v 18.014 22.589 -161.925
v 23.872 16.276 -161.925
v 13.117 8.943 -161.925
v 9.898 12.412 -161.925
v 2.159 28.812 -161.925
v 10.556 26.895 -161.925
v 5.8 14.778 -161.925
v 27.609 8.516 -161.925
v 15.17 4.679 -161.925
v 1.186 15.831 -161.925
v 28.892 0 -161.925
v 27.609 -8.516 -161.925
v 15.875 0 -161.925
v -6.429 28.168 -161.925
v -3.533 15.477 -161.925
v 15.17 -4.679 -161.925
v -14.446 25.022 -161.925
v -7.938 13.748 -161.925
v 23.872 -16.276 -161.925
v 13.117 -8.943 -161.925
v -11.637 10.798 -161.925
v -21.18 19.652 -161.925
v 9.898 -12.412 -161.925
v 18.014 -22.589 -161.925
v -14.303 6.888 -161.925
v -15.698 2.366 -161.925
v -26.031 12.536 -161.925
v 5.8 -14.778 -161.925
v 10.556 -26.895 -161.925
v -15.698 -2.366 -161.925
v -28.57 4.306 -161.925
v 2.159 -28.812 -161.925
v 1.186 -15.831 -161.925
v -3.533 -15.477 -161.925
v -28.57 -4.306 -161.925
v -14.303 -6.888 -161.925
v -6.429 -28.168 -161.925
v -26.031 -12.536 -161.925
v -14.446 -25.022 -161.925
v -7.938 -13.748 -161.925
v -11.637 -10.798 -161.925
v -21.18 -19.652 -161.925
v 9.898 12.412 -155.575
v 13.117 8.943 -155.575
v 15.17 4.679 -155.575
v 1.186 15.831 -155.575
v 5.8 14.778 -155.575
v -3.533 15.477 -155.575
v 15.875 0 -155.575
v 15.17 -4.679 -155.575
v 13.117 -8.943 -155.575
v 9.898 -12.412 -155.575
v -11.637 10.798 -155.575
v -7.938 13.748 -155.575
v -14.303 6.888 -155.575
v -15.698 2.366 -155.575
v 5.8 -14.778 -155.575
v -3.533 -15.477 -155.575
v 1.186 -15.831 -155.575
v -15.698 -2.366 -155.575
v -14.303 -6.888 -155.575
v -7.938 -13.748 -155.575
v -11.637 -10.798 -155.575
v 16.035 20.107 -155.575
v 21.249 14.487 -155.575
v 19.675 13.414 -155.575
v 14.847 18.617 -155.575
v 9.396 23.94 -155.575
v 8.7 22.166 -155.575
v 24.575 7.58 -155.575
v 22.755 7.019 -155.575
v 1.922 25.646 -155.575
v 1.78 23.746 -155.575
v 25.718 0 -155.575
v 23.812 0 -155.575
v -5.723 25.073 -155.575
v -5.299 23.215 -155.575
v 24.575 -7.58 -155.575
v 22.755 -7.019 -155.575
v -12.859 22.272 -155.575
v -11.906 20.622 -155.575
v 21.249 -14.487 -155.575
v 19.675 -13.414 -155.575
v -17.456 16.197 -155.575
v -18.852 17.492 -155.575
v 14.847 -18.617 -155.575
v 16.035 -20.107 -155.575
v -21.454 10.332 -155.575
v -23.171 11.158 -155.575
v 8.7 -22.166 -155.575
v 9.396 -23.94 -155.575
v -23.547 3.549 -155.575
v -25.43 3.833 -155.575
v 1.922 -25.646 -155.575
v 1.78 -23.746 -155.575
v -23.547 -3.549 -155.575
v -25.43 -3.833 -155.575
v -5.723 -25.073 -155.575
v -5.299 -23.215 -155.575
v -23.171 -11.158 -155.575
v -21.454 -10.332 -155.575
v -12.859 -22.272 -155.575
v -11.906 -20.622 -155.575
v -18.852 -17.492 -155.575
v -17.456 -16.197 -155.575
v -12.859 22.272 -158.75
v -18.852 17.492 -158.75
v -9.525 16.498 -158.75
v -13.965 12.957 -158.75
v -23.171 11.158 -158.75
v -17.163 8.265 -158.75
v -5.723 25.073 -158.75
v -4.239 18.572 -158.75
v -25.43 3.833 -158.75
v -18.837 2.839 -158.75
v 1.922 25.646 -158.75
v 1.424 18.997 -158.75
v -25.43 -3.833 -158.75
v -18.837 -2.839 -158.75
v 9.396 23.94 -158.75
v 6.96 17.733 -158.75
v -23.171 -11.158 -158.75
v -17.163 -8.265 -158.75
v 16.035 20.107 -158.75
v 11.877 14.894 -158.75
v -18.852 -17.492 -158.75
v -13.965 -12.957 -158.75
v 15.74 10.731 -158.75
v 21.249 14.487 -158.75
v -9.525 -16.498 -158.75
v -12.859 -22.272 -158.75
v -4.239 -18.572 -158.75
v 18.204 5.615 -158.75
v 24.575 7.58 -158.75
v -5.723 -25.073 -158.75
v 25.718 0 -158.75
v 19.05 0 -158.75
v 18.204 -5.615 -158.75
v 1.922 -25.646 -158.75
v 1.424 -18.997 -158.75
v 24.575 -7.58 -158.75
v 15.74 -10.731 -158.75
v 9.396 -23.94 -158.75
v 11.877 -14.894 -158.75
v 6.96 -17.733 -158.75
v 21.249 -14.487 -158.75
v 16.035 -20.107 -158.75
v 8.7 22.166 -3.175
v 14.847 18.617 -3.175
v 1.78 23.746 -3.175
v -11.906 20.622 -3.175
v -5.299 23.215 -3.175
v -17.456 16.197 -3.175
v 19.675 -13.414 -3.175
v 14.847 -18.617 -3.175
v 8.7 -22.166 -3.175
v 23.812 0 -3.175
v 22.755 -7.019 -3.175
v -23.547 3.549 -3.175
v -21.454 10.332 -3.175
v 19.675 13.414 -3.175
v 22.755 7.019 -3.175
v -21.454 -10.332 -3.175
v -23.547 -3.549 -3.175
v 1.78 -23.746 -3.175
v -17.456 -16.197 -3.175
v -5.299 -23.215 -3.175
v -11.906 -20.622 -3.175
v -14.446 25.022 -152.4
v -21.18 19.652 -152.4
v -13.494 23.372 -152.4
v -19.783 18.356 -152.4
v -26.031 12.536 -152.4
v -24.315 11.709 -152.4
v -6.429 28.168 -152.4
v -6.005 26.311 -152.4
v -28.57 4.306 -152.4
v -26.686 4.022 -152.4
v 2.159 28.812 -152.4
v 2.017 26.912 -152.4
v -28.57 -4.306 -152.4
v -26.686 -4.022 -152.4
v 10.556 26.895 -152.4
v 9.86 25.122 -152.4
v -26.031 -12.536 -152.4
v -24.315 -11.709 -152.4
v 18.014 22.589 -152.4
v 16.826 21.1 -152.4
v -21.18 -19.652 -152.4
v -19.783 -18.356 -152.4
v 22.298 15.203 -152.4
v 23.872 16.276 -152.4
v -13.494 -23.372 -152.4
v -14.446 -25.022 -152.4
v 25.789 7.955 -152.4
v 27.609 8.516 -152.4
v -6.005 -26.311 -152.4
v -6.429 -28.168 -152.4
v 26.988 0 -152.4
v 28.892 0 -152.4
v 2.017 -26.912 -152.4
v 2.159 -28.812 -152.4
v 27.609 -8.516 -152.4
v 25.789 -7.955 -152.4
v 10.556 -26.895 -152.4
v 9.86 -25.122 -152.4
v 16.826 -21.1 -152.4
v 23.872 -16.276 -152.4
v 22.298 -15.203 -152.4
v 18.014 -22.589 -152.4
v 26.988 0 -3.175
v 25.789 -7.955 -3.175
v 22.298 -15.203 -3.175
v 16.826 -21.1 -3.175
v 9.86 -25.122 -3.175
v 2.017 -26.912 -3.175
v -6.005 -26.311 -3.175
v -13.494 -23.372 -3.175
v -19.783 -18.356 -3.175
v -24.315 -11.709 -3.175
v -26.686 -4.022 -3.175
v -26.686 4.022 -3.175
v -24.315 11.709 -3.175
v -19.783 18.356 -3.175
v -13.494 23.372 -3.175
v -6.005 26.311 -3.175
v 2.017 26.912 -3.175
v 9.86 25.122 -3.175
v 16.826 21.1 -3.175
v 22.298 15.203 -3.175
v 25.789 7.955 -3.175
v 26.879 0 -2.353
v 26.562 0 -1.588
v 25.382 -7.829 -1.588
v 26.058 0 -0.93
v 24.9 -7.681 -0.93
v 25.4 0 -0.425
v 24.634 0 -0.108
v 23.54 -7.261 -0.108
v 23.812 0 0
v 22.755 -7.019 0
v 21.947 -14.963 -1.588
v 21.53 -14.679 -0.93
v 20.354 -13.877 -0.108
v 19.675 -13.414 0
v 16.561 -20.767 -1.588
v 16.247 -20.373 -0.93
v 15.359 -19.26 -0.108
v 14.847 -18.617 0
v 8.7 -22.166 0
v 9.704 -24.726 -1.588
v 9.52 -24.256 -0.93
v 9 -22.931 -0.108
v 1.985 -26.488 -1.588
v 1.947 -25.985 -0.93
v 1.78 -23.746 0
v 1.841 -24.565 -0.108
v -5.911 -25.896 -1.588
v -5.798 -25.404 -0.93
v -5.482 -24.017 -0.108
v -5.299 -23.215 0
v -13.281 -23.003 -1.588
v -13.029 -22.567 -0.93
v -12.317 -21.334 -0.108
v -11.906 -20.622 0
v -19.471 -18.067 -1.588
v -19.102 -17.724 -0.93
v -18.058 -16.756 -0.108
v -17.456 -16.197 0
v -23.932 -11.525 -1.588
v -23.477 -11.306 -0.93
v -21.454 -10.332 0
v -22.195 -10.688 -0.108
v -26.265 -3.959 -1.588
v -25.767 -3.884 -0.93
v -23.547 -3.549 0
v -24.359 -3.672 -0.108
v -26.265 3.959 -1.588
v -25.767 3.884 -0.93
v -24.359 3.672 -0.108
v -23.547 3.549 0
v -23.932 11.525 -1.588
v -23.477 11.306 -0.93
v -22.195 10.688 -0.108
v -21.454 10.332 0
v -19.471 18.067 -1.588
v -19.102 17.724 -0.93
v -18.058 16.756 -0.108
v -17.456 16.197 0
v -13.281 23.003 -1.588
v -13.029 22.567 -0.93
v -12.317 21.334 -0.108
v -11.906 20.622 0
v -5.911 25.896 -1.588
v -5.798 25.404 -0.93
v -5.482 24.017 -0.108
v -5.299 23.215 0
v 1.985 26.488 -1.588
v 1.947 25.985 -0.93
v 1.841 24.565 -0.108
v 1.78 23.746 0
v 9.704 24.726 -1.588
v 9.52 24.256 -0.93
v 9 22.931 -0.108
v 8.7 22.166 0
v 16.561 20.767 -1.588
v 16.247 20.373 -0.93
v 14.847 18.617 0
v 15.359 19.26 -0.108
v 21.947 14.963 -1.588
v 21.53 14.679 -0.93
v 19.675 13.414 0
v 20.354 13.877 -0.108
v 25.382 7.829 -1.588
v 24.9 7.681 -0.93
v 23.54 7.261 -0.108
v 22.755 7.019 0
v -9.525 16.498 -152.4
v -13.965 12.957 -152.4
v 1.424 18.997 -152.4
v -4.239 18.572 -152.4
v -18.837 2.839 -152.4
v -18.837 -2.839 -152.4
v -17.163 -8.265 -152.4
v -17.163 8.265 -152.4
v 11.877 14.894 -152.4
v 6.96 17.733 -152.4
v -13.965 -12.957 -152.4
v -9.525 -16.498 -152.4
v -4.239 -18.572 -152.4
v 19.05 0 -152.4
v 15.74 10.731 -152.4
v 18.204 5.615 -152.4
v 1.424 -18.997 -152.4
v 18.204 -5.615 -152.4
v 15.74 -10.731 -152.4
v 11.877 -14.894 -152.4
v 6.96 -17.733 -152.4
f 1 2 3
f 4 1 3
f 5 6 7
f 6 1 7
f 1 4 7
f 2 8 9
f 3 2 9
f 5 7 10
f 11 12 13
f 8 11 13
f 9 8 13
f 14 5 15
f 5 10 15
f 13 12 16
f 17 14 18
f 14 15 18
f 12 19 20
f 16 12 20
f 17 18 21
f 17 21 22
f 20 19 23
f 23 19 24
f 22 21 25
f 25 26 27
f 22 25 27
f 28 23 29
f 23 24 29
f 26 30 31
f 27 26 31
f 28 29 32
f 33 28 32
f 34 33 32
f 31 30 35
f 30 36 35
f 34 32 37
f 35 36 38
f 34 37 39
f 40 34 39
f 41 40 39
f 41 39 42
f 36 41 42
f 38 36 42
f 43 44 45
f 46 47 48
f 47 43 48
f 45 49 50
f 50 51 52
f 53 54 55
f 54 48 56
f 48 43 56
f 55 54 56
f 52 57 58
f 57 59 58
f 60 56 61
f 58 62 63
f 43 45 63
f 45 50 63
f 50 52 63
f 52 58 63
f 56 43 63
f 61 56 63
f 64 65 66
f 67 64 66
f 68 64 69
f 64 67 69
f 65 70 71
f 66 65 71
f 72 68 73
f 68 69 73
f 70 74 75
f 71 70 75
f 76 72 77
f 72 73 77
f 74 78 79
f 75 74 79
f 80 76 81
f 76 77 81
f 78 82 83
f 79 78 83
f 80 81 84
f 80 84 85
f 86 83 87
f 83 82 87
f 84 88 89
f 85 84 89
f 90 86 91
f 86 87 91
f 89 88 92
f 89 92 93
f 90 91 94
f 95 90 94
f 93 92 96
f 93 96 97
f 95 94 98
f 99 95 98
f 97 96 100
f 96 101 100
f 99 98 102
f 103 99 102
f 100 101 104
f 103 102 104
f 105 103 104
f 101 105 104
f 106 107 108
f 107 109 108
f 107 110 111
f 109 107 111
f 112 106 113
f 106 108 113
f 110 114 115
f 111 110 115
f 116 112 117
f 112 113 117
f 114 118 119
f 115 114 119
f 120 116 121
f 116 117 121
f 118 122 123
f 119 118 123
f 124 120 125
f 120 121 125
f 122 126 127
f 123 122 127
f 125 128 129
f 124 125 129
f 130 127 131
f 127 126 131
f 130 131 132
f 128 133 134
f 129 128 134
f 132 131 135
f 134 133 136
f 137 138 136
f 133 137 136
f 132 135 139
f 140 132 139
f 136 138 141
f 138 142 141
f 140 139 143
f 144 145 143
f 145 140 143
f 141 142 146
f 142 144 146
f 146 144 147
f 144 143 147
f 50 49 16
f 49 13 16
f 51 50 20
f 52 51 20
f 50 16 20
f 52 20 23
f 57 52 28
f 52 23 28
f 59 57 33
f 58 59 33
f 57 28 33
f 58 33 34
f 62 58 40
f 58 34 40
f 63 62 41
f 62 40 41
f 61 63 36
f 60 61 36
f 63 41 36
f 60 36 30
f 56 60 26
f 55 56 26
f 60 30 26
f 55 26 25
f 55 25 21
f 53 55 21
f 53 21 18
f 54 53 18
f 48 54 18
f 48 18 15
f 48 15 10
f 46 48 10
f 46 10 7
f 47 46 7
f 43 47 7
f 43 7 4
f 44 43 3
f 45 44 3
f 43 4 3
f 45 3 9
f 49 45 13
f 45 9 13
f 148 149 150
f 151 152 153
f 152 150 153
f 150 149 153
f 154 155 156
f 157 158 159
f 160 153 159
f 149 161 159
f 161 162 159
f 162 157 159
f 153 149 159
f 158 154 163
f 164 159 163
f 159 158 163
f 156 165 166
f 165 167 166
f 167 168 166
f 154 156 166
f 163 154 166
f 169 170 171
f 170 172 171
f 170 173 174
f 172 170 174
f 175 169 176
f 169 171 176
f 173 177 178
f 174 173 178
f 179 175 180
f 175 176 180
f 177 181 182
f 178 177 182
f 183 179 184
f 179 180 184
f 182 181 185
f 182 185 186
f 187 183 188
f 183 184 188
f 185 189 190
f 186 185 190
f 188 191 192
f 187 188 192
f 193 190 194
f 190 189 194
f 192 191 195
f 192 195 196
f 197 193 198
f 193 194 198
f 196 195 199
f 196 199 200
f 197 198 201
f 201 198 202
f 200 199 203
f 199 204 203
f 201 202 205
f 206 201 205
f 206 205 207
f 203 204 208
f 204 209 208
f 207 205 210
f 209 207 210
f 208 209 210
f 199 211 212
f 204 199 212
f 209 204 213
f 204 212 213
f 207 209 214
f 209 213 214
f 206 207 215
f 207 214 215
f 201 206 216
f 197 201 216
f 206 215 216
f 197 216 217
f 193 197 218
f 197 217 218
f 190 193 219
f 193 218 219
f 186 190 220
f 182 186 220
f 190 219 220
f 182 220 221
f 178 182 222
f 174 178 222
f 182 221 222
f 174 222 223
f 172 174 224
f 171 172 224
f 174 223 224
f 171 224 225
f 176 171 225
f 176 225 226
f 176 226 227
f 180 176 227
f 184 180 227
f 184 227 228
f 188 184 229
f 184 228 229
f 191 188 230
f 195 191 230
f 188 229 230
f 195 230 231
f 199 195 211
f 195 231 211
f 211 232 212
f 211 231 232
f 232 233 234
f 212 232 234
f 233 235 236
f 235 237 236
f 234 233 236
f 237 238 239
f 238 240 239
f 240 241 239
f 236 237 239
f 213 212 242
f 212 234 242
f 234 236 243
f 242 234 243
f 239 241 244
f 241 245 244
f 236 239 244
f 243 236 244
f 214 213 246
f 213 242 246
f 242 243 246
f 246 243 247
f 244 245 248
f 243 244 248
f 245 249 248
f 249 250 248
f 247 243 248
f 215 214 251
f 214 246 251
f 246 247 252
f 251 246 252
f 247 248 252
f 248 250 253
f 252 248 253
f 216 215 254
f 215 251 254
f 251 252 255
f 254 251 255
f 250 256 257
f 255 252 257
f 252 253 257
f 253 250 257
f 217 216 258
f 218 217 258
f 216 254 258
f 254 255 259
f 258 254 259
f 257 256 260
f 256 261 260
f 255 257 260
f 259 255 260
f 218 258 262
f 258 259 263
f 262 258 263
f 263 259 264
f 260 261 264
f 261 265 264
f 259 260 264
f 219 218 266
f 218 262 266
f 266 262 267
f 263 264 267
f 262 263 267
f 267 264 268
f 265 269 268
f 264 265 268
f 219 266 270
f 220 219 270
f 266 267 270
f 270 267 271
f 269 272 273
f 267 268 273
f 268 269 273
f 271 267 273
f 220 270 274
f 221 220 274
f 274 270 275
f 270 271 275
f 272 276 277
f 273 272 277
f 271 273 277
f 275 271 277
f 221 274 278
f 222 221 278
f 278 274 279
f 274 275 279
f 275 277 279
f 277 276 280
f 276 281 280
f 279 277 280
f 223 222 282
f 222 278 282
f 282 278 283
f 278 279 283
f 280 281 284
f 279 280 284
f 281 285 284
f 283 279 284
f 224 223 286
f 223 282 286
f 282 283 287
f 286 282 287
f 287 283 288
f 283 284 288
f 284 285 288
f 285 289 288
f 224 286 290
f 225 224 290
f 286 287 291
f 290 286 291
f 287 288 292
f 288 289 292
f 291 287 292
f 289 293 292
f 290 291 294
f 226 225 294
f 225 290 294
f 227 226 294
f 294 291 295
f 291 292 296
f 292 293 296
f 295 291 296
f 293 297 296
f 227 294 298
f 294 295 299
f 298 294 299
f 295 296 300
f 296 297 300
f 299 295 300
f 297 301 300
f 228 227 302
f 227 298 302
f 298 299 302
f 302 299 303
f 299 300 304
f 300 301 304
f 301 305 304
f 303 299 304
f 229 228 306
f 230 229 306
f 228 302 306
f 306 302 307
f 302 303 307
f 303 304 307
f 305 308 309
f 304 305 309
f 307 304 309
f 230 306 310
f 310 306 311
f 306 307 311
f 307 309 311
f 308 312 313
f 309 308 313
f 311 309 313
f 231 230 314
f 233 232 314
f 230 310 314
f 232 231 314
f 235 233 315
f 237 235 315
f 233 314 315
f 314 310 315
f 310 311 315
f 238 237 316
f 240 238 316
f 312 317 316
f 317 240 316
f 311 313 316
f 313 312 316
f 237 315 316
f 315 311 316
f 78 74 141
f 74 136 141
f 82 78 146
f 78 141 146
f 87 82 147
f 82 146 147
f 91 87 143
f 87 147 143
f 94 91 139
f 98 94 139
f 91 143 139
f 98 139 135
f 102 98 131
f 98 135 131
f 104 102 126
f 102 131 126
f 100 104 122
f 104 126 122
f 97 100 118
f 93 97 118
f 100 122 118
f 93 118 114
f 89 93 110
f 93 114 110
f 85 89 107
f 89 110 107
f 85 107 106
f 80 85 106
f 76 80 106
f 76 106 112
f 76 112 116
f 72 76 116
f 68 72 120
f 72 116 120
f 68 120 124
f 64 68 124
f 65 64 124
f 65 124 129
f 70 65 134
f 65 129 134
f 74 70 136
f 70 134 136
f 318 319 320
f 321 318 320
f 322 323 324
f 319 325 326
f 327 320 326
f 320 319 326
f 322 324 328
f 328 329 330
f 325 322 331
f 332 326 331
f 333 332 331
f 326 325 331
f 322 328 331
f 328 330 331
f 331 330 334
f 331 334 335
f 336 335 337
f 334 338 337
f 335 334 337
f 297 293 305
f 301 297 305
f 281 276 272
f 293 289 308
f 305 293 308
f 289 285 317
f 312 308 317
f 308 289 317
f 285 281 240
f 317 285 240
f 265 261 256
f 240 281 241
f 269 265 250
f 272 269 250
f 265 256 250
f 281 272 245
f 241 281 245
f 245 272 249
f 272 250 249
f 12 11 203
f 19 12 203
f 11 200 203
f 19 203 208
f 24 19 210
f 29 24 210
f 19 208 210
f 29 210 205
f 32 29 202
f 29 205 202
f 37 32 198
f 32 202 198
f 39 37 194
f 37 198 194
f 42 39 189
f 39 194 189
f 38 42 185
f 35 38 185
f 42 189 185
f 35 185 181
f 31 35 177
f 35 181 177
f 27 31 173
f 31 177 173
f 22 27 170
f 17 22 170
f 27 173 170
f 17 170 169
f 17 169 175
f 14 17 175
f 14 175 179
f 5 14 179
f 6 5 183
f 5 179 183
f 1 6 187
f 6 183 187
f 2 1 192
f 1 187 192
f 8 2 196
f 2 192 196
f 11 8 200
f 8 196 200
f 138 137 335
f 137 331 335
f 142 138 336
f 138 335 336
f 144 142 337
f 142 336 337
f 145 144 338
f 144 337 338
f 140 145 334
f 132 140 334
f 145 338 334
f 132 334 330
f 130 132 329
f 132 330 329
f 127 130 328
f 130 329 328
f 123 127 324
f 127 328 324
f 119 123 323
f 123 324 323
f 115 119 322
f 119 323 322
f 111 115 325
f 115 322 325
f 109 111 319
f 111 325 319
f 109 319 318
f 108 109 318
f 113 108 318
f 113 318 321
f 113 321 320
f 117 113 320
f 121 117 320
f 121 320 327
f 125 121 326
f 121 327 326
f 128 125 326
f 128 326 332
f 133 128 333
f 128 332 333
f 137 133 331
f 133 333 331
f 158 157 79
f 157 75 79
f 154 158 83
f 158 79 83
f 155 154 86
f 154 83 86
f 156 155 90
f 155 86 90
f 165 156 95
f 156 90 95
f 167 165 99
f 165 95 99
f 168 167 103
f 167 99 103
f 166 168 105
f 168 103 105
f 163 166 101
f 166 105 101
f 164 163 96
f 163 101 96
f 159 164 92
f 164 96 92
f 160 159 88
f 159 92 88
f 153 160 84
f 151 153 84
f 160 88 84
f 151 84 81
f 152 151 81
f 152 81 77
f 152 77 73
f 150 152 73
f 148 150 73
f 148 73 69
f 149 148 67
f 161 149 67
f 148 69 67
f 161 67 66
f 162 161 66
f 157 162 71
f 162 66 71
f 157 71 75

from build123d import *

# Parameters (mm, degrees)
FILLET1_R = 3.175


with BuildPart() as part:
    # Sketch1 → Revolve1 (revolve)
    with BuildSketch(Plane(origin=(0, 0, 0), x_dir=(0, 0, -1), z_dir=(1, 0, 0)), mode=Mode.PRIVATE) as revolve1_sk:
        Polygon((0, 26.9875), (0, 0), (3.175, 0), (3.175, 23.8125), (155.575, 23.8125), (155.575, 25.7175), (158.75, 25.7175), (158.75, 19.05), (152.4, 19.05), (152.4, 0), (155.575, 0), (155.575, 15.875), (161.925, 15.875), (161.925, 28.8925), (152.4, 28.8925), (152.4, 26.9875), align=None)
    revolve(revolve1_sk.sketch.rotate(Axis((0, 0, 0), (0, 0, -1)), 90), axis=Axis((0, 0, 0), (0, 0, -1)))

    # Fillet1
    fillet1_edges = [part.edges().sort_by_distance(p)[0] for p in [
        (-26.9875, 0, 0),
    ]]
    fillet(fillet1_edges, radius=FILLET1_R)


solid = part.part
